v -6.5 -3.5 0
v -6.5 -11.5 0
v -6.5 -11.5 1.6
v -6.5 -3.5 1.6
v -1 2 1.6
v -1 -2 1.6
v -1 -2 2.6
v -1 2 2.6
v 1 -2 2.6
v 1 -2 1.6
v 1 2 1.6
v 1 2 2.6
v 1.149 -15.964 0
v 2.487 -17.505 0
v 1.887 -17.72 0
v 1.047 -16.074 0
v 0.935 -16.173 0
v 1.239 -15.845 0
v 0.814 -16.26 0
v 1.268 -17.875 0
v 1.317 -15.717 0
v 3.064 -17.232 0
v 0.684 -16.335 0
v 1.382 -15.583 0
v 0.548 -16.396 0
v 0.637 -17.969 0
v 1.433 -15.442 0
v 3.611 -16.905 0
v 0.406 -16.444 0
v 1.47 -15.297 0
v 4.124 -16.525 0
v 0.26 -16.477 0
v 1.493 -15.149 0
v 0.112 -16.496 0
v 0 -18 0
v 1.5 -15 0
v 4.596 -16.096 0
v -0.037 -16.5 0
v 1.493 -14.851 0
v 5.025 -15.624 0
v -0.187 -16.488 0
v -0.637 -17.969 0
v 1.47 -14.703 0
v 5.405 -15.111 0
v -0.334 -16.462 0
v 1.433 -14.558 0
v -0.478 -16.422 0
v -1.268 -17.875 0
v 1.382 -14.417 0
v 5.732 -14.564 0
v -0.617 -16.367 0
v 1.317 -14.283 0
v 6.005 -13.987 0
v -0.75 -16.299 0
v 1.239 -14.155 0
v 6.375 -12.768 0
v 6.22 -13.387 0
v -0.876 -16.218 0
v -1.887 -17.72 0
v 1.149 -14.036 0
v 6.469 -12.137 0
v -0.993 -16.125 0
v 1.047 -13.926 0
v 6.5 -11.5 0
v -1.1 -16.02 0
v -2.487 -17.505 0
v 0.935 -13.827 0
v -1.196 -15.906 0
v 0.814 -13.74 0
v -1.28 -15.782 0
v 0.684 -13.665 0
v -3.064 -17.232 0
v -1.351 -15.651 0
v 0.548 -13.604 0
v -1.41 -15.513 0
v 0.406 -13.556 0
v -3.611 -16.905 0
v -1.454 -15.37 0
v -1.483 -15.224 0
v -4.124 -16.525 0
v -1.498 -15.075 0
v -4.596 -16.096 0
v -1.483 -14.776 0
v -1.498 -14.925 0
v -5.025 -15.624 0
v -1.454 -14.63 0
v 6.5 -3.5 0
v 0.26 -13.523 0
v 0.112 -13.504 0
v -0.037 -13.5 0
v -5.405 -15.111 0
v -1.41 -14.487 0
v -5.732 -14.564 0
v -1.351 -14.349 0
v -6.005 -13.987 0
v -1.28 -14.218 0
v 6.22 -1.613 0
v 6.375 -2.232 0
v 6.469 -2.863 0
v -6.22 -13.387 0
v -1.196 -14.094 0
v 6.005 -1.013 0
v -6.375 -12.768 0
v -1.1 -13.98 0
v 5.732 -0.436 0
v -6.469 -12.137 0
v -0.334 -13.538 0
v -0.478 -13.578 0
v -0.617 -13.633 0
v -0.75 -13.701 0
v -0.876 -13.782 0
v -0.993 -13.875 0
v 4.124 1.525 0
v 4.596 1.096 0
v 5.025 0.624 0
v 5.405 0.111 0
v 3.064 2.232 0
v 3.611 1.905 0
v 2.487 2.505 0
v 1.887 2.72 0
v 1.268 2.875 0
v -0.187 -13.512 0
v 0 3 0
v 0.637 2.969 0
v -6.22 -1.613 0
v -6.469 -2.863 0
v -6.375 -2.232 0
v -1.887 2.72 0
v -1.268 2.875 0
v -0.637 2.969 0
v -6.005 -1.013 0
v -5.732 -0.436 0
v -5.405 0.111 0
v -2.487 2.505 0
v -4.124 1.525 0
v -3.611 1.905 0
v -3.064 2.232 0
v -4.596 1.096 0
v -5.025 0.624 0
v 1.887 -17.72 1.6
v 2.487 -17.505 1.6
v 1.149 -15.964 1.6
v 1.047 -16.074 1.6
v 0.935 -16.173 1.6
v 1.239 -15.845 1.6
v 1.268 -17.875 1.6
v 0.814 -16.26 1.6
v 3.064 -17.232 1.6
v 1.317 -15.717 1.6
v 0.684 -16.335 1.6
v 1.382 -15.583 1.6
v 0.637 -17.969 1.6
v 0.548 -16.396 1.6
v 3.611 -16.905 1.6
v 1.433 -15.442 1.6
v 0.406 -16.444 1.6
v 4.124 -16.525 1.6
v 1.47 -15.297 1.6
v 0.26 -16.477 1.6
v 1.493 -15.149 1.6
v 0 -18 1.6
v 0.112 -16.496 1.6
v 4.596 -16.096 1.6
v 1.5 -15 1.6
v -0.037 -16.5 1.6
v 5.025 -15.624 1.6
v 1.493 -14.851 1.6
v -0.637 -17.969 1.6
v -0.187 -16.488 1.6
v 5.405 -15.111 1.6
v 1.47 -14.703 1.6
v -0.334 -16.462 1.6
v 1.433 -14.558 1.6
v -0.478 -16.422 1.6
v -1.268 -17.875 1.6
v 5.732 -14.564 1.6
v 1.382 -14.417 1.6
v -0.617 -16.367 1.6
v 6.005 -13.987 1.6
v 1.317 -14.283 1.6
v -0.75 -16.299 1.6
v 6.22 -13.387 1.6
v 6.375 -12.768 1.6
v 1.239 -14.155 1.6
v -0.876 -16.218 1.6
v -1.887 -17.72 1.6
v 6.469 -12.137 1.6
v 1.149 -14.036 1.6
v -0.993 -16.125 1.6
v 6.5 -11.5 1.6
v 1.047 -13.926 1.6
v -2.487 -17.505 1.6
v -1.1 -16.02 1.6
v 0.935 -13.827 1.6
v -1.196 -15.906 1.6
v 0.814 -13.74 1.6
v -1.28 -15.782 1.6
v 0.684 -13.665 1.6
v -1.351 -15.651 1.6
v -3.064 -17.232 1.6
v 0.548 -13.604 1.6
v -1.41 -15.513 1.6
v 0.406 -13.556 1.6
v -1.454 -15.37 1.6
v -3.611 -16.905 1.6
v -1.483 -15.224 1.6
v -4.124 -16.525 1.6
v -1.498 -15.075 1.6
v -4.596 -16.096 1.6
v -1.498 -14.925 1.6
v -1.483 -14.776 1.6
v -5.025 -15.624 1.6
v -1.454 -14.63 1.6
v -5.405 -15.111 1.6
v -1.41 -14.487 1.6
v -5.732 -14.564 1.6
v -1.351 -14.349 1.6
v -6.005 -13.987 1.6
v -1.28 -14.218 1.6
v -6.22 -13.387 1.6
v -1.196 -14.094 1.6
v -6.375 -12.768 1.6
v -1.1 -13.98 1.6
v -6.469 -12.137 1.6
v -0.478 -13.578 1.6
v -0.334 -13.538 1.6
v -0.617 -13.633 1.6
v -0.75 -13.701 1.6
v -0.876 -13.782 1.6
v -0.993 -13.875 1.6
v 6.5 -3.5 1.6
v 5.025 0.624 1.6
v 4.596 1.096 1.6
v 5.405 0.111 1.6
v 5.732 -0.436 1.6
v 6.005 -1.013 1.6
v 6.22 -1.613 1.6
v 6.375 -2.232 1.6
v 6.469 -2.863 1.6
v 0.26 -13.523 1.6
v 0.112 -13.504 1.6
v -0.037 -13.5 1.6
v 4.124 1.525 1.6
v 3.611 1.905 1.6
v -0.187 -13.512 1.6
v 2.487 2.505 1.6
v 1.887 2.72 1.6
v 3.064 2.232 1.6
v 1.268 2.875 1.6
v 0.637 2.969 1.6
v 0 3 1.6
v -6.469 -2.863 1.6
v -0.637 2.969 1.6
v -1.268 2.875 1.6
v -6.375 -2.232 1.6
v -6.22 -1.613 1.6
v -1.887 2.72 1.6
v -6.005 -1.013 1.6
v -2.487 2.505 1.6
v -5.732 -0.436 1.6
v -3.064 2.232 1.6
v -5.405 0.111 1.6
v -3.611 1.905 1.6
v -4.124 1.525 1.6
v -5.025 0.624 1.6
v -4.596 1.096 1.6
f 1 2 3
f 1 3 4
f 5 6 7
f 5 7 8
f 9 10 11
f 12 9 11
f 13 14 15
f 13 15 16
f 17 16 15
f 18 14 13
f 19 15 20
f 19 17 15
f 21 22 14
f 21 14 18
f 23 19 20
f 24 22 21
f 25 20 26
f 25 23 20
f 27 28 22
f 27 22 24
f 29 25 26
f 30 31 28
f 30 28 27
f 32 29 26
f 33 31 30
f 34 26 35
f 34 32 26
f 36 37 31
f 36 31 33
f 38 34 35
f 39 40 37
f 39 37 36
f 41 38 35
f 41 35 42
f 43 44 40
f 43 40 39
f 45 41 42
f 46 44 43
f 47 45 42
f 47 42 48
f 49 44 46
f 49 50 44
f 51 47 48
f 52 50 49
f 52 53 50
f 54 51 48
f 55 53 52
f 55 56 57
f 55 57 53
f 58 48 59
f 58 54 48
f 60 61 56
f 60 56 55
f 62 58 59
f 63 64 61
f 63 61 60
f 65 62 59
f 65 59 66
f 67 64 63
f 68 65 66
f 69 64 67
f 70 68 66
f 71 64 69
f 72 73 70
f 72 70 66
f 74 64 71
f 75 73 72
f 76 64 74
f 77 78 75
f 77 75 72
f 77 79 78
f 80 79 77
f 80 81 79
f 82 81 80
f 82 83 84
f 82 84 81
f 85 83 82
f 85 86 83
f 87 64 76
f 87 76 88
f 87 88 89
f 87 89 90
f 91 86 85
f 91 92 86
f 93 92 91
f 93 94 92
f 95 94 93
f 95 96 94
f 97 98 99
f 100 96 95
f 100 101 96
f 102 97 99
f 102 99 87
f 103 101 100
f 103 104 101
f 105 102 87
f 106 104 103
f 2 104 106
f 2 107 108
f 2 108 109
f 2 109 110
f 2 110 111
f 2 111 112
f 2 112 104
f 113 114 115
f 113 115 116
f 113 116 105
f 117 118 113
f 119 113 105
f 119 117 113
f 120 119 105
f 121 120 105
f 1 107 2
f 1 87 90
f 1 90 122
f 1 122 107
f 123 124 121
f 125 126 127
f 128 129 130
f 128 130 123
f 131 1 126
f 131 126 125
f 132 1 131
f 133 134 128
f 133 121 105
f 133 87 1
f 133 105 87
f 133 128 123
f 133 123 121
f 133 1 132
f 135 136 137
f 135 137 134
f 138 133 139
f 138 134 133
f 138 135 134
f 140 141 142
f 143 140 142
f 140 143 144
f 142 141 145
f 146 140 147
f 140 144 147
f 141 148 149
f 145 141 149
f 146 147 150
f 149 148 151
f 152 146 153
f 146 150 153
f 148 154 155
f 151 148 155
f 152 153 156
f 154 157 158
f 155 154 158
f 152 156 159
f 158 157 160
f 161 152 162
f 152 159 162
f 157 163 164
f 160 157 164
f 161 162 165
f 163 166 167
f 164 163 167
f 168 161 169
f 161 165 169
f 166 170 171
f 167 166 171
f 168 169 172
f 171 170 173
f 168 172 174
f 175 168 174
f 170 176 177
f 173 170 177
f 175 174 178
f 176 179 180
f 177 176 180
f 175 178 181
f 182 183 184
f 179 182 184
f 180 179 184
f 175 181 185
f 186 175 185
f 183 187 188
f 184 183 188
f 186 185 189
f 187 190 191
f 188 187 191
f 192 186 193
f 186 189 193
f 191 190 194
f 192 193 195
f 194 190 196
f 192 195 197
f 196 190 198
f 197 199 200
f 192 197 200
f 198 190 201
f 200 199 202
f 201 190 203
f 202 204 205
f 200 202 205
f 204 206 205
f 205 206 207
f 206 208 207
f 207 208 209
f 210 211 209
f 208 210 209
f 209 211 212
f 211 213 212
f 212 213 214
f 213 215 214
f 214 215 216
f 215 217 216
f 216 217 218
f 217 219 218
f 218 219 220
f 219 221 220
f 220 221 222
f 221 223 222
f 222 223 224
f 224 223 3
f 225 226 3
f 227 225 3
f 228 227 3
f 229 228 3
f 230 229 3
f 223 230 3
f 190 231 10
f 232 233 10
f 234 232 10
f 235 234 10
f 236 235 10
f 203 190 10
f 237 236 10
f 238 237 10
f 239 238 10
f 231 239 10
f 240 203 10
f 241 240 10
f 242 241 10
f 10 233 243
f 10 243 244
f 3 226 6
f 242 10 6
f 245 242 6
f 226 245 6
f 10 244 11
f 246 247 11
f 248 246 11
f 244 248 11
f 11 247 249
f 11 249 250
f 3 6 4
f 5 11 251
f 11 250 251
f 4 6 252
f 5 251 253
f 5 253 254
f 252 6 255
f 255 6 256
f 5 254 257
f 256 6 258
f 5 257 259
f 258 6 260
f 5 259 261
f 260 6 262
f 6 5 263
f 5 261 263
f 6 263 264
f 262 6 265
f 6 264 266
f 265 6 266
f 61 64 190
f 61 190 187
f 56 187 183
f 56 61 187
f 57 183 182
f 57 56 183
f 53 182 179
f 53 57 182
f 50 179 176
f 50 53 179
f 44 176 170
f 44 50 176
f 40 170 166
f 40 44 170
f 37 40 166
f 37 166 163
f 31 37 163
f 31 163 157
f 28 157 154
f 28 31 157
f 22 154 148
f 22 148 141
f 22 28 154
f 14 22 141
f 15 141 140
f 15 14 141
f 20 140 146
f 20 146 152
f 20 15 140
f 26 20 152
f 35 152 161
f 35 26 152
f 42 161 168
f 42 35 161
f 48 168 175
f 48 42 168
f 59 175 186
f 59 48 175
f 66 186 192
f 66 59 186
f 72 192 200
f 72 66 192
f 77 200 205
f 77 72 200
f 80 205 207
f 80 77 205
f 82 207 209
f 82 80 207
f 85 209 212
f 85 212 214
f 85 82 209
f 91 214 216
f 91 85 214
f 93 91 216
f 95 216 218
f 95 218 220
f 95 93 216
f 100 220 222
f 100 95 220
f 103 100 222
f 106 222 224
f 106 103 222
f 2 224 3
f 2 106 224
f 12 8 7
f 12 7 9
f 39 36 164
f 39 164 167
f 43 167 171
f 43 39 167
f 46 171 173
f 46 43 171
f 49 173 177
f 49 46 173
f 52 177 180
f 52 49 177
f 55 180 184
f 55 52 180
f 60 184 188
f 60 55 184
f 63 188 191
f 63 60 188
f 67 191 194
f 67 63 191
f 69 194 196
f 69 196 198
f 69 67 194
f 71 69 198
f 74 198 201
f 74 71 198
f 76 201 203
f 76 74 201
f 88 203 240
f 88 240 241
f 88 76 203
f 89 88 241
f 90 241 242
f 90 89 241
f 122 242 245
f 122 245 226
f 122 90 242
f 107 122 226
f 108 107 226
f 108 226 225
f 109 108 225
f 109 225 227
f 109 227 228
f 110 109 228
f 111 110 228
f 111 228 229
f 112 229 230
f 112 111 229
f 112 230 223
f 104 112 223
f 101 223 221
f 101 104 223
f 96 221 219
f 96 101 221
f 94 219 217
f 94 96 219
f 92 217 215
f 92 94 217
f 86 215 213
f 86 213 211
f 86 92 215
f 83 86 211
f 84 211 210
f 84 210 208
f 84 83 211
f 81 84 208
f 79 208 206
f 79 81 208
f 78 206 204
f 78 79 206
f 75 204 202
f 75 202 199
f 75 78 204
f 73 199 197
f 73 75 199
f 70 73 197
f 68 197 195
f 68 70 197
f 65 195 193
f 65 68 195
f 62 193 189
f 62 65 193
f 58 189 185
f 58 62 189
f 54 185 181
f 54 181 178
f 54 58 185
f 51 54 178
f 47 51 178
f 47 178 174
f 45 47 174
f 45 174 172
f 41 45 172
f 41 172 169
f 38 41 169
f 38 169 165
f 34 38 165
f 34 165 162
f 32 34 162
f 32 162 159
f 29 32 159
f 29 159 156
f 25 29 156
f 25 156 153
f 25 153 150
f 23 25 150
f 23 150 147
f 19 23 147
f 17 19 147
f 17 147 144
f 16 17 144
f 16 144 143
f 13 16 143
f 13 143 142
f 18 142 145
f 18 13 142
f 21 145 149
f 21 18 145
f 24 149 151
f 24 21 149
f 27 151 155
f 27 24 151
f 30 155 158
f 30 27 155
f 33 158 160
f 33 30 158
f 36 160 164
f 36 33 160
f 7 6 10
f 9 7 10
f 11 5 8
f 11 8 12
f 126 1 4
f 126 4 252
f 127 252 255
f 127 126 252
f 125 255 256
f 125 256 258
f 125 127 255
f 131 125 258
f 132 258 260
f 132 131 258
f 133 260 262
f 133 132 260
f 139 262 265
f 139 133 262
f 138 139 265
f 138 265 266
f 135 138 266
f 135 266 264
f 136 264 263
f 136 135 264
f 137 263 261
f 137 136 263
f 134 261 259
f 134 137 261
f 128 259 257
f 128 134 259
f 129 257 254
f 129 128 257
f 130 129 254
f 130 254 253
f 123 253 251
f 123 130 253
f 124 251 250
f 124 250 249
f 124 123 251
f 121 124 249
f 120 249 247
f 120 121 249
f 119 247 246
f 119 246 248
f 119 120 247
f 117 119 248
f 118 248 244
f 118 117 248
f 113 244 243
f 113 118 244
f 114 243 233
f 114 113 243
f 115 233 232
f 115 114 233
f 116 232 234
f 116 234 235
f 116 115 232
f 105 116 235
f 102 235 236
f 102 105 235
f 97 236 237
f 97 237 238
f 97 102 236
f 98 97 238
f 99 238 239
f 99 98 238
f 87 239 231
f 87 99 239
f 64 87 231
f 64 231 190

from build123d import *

# Parameters (mm, degrees)
ESQUISSE1_R        = 1.5
BOSS_EXTRU_1_DEPTH = 1.6
ESQUISSE2_W        = 2
ESQUISSE2_H        = 4
BOSS_EXTRU_2_DEPTH = 1


with BuildPart() as part:
    # Esquisse1 → Boss.-Extru.1 (new body)
    with BuildSketch(Plane.XY):
        with BuildLine():
            Line((6.5, -3.5), (6.5, -11.5))
            ThreePointArc((6.5, -11.5), (0, -18), (-6.5, -11.5))
            Line((-6.5, -11.5), (-6.5, -3.5))
            ThreePointArc((-6.5, -3.5), (0, 3), (6.5, -3.5))
        make_face()
        with Locations((0, -15)):
            Circle(ESQUISSE1_R, mode=Mode.SUBTRACT)
    extrude(amount=BOSS_EXTRU_1_DEPTH)

    # Esquisse2 → Boss.-Extru.2 (add)
    with BuildSketch(Plane.XY.offset(1.6)):
        Rectangle(ESQUISSE2_W, ESQUISSE2_H)
    extrude(amount=BOSS_EXTRU_2_DEPTH)


solid = part.part
